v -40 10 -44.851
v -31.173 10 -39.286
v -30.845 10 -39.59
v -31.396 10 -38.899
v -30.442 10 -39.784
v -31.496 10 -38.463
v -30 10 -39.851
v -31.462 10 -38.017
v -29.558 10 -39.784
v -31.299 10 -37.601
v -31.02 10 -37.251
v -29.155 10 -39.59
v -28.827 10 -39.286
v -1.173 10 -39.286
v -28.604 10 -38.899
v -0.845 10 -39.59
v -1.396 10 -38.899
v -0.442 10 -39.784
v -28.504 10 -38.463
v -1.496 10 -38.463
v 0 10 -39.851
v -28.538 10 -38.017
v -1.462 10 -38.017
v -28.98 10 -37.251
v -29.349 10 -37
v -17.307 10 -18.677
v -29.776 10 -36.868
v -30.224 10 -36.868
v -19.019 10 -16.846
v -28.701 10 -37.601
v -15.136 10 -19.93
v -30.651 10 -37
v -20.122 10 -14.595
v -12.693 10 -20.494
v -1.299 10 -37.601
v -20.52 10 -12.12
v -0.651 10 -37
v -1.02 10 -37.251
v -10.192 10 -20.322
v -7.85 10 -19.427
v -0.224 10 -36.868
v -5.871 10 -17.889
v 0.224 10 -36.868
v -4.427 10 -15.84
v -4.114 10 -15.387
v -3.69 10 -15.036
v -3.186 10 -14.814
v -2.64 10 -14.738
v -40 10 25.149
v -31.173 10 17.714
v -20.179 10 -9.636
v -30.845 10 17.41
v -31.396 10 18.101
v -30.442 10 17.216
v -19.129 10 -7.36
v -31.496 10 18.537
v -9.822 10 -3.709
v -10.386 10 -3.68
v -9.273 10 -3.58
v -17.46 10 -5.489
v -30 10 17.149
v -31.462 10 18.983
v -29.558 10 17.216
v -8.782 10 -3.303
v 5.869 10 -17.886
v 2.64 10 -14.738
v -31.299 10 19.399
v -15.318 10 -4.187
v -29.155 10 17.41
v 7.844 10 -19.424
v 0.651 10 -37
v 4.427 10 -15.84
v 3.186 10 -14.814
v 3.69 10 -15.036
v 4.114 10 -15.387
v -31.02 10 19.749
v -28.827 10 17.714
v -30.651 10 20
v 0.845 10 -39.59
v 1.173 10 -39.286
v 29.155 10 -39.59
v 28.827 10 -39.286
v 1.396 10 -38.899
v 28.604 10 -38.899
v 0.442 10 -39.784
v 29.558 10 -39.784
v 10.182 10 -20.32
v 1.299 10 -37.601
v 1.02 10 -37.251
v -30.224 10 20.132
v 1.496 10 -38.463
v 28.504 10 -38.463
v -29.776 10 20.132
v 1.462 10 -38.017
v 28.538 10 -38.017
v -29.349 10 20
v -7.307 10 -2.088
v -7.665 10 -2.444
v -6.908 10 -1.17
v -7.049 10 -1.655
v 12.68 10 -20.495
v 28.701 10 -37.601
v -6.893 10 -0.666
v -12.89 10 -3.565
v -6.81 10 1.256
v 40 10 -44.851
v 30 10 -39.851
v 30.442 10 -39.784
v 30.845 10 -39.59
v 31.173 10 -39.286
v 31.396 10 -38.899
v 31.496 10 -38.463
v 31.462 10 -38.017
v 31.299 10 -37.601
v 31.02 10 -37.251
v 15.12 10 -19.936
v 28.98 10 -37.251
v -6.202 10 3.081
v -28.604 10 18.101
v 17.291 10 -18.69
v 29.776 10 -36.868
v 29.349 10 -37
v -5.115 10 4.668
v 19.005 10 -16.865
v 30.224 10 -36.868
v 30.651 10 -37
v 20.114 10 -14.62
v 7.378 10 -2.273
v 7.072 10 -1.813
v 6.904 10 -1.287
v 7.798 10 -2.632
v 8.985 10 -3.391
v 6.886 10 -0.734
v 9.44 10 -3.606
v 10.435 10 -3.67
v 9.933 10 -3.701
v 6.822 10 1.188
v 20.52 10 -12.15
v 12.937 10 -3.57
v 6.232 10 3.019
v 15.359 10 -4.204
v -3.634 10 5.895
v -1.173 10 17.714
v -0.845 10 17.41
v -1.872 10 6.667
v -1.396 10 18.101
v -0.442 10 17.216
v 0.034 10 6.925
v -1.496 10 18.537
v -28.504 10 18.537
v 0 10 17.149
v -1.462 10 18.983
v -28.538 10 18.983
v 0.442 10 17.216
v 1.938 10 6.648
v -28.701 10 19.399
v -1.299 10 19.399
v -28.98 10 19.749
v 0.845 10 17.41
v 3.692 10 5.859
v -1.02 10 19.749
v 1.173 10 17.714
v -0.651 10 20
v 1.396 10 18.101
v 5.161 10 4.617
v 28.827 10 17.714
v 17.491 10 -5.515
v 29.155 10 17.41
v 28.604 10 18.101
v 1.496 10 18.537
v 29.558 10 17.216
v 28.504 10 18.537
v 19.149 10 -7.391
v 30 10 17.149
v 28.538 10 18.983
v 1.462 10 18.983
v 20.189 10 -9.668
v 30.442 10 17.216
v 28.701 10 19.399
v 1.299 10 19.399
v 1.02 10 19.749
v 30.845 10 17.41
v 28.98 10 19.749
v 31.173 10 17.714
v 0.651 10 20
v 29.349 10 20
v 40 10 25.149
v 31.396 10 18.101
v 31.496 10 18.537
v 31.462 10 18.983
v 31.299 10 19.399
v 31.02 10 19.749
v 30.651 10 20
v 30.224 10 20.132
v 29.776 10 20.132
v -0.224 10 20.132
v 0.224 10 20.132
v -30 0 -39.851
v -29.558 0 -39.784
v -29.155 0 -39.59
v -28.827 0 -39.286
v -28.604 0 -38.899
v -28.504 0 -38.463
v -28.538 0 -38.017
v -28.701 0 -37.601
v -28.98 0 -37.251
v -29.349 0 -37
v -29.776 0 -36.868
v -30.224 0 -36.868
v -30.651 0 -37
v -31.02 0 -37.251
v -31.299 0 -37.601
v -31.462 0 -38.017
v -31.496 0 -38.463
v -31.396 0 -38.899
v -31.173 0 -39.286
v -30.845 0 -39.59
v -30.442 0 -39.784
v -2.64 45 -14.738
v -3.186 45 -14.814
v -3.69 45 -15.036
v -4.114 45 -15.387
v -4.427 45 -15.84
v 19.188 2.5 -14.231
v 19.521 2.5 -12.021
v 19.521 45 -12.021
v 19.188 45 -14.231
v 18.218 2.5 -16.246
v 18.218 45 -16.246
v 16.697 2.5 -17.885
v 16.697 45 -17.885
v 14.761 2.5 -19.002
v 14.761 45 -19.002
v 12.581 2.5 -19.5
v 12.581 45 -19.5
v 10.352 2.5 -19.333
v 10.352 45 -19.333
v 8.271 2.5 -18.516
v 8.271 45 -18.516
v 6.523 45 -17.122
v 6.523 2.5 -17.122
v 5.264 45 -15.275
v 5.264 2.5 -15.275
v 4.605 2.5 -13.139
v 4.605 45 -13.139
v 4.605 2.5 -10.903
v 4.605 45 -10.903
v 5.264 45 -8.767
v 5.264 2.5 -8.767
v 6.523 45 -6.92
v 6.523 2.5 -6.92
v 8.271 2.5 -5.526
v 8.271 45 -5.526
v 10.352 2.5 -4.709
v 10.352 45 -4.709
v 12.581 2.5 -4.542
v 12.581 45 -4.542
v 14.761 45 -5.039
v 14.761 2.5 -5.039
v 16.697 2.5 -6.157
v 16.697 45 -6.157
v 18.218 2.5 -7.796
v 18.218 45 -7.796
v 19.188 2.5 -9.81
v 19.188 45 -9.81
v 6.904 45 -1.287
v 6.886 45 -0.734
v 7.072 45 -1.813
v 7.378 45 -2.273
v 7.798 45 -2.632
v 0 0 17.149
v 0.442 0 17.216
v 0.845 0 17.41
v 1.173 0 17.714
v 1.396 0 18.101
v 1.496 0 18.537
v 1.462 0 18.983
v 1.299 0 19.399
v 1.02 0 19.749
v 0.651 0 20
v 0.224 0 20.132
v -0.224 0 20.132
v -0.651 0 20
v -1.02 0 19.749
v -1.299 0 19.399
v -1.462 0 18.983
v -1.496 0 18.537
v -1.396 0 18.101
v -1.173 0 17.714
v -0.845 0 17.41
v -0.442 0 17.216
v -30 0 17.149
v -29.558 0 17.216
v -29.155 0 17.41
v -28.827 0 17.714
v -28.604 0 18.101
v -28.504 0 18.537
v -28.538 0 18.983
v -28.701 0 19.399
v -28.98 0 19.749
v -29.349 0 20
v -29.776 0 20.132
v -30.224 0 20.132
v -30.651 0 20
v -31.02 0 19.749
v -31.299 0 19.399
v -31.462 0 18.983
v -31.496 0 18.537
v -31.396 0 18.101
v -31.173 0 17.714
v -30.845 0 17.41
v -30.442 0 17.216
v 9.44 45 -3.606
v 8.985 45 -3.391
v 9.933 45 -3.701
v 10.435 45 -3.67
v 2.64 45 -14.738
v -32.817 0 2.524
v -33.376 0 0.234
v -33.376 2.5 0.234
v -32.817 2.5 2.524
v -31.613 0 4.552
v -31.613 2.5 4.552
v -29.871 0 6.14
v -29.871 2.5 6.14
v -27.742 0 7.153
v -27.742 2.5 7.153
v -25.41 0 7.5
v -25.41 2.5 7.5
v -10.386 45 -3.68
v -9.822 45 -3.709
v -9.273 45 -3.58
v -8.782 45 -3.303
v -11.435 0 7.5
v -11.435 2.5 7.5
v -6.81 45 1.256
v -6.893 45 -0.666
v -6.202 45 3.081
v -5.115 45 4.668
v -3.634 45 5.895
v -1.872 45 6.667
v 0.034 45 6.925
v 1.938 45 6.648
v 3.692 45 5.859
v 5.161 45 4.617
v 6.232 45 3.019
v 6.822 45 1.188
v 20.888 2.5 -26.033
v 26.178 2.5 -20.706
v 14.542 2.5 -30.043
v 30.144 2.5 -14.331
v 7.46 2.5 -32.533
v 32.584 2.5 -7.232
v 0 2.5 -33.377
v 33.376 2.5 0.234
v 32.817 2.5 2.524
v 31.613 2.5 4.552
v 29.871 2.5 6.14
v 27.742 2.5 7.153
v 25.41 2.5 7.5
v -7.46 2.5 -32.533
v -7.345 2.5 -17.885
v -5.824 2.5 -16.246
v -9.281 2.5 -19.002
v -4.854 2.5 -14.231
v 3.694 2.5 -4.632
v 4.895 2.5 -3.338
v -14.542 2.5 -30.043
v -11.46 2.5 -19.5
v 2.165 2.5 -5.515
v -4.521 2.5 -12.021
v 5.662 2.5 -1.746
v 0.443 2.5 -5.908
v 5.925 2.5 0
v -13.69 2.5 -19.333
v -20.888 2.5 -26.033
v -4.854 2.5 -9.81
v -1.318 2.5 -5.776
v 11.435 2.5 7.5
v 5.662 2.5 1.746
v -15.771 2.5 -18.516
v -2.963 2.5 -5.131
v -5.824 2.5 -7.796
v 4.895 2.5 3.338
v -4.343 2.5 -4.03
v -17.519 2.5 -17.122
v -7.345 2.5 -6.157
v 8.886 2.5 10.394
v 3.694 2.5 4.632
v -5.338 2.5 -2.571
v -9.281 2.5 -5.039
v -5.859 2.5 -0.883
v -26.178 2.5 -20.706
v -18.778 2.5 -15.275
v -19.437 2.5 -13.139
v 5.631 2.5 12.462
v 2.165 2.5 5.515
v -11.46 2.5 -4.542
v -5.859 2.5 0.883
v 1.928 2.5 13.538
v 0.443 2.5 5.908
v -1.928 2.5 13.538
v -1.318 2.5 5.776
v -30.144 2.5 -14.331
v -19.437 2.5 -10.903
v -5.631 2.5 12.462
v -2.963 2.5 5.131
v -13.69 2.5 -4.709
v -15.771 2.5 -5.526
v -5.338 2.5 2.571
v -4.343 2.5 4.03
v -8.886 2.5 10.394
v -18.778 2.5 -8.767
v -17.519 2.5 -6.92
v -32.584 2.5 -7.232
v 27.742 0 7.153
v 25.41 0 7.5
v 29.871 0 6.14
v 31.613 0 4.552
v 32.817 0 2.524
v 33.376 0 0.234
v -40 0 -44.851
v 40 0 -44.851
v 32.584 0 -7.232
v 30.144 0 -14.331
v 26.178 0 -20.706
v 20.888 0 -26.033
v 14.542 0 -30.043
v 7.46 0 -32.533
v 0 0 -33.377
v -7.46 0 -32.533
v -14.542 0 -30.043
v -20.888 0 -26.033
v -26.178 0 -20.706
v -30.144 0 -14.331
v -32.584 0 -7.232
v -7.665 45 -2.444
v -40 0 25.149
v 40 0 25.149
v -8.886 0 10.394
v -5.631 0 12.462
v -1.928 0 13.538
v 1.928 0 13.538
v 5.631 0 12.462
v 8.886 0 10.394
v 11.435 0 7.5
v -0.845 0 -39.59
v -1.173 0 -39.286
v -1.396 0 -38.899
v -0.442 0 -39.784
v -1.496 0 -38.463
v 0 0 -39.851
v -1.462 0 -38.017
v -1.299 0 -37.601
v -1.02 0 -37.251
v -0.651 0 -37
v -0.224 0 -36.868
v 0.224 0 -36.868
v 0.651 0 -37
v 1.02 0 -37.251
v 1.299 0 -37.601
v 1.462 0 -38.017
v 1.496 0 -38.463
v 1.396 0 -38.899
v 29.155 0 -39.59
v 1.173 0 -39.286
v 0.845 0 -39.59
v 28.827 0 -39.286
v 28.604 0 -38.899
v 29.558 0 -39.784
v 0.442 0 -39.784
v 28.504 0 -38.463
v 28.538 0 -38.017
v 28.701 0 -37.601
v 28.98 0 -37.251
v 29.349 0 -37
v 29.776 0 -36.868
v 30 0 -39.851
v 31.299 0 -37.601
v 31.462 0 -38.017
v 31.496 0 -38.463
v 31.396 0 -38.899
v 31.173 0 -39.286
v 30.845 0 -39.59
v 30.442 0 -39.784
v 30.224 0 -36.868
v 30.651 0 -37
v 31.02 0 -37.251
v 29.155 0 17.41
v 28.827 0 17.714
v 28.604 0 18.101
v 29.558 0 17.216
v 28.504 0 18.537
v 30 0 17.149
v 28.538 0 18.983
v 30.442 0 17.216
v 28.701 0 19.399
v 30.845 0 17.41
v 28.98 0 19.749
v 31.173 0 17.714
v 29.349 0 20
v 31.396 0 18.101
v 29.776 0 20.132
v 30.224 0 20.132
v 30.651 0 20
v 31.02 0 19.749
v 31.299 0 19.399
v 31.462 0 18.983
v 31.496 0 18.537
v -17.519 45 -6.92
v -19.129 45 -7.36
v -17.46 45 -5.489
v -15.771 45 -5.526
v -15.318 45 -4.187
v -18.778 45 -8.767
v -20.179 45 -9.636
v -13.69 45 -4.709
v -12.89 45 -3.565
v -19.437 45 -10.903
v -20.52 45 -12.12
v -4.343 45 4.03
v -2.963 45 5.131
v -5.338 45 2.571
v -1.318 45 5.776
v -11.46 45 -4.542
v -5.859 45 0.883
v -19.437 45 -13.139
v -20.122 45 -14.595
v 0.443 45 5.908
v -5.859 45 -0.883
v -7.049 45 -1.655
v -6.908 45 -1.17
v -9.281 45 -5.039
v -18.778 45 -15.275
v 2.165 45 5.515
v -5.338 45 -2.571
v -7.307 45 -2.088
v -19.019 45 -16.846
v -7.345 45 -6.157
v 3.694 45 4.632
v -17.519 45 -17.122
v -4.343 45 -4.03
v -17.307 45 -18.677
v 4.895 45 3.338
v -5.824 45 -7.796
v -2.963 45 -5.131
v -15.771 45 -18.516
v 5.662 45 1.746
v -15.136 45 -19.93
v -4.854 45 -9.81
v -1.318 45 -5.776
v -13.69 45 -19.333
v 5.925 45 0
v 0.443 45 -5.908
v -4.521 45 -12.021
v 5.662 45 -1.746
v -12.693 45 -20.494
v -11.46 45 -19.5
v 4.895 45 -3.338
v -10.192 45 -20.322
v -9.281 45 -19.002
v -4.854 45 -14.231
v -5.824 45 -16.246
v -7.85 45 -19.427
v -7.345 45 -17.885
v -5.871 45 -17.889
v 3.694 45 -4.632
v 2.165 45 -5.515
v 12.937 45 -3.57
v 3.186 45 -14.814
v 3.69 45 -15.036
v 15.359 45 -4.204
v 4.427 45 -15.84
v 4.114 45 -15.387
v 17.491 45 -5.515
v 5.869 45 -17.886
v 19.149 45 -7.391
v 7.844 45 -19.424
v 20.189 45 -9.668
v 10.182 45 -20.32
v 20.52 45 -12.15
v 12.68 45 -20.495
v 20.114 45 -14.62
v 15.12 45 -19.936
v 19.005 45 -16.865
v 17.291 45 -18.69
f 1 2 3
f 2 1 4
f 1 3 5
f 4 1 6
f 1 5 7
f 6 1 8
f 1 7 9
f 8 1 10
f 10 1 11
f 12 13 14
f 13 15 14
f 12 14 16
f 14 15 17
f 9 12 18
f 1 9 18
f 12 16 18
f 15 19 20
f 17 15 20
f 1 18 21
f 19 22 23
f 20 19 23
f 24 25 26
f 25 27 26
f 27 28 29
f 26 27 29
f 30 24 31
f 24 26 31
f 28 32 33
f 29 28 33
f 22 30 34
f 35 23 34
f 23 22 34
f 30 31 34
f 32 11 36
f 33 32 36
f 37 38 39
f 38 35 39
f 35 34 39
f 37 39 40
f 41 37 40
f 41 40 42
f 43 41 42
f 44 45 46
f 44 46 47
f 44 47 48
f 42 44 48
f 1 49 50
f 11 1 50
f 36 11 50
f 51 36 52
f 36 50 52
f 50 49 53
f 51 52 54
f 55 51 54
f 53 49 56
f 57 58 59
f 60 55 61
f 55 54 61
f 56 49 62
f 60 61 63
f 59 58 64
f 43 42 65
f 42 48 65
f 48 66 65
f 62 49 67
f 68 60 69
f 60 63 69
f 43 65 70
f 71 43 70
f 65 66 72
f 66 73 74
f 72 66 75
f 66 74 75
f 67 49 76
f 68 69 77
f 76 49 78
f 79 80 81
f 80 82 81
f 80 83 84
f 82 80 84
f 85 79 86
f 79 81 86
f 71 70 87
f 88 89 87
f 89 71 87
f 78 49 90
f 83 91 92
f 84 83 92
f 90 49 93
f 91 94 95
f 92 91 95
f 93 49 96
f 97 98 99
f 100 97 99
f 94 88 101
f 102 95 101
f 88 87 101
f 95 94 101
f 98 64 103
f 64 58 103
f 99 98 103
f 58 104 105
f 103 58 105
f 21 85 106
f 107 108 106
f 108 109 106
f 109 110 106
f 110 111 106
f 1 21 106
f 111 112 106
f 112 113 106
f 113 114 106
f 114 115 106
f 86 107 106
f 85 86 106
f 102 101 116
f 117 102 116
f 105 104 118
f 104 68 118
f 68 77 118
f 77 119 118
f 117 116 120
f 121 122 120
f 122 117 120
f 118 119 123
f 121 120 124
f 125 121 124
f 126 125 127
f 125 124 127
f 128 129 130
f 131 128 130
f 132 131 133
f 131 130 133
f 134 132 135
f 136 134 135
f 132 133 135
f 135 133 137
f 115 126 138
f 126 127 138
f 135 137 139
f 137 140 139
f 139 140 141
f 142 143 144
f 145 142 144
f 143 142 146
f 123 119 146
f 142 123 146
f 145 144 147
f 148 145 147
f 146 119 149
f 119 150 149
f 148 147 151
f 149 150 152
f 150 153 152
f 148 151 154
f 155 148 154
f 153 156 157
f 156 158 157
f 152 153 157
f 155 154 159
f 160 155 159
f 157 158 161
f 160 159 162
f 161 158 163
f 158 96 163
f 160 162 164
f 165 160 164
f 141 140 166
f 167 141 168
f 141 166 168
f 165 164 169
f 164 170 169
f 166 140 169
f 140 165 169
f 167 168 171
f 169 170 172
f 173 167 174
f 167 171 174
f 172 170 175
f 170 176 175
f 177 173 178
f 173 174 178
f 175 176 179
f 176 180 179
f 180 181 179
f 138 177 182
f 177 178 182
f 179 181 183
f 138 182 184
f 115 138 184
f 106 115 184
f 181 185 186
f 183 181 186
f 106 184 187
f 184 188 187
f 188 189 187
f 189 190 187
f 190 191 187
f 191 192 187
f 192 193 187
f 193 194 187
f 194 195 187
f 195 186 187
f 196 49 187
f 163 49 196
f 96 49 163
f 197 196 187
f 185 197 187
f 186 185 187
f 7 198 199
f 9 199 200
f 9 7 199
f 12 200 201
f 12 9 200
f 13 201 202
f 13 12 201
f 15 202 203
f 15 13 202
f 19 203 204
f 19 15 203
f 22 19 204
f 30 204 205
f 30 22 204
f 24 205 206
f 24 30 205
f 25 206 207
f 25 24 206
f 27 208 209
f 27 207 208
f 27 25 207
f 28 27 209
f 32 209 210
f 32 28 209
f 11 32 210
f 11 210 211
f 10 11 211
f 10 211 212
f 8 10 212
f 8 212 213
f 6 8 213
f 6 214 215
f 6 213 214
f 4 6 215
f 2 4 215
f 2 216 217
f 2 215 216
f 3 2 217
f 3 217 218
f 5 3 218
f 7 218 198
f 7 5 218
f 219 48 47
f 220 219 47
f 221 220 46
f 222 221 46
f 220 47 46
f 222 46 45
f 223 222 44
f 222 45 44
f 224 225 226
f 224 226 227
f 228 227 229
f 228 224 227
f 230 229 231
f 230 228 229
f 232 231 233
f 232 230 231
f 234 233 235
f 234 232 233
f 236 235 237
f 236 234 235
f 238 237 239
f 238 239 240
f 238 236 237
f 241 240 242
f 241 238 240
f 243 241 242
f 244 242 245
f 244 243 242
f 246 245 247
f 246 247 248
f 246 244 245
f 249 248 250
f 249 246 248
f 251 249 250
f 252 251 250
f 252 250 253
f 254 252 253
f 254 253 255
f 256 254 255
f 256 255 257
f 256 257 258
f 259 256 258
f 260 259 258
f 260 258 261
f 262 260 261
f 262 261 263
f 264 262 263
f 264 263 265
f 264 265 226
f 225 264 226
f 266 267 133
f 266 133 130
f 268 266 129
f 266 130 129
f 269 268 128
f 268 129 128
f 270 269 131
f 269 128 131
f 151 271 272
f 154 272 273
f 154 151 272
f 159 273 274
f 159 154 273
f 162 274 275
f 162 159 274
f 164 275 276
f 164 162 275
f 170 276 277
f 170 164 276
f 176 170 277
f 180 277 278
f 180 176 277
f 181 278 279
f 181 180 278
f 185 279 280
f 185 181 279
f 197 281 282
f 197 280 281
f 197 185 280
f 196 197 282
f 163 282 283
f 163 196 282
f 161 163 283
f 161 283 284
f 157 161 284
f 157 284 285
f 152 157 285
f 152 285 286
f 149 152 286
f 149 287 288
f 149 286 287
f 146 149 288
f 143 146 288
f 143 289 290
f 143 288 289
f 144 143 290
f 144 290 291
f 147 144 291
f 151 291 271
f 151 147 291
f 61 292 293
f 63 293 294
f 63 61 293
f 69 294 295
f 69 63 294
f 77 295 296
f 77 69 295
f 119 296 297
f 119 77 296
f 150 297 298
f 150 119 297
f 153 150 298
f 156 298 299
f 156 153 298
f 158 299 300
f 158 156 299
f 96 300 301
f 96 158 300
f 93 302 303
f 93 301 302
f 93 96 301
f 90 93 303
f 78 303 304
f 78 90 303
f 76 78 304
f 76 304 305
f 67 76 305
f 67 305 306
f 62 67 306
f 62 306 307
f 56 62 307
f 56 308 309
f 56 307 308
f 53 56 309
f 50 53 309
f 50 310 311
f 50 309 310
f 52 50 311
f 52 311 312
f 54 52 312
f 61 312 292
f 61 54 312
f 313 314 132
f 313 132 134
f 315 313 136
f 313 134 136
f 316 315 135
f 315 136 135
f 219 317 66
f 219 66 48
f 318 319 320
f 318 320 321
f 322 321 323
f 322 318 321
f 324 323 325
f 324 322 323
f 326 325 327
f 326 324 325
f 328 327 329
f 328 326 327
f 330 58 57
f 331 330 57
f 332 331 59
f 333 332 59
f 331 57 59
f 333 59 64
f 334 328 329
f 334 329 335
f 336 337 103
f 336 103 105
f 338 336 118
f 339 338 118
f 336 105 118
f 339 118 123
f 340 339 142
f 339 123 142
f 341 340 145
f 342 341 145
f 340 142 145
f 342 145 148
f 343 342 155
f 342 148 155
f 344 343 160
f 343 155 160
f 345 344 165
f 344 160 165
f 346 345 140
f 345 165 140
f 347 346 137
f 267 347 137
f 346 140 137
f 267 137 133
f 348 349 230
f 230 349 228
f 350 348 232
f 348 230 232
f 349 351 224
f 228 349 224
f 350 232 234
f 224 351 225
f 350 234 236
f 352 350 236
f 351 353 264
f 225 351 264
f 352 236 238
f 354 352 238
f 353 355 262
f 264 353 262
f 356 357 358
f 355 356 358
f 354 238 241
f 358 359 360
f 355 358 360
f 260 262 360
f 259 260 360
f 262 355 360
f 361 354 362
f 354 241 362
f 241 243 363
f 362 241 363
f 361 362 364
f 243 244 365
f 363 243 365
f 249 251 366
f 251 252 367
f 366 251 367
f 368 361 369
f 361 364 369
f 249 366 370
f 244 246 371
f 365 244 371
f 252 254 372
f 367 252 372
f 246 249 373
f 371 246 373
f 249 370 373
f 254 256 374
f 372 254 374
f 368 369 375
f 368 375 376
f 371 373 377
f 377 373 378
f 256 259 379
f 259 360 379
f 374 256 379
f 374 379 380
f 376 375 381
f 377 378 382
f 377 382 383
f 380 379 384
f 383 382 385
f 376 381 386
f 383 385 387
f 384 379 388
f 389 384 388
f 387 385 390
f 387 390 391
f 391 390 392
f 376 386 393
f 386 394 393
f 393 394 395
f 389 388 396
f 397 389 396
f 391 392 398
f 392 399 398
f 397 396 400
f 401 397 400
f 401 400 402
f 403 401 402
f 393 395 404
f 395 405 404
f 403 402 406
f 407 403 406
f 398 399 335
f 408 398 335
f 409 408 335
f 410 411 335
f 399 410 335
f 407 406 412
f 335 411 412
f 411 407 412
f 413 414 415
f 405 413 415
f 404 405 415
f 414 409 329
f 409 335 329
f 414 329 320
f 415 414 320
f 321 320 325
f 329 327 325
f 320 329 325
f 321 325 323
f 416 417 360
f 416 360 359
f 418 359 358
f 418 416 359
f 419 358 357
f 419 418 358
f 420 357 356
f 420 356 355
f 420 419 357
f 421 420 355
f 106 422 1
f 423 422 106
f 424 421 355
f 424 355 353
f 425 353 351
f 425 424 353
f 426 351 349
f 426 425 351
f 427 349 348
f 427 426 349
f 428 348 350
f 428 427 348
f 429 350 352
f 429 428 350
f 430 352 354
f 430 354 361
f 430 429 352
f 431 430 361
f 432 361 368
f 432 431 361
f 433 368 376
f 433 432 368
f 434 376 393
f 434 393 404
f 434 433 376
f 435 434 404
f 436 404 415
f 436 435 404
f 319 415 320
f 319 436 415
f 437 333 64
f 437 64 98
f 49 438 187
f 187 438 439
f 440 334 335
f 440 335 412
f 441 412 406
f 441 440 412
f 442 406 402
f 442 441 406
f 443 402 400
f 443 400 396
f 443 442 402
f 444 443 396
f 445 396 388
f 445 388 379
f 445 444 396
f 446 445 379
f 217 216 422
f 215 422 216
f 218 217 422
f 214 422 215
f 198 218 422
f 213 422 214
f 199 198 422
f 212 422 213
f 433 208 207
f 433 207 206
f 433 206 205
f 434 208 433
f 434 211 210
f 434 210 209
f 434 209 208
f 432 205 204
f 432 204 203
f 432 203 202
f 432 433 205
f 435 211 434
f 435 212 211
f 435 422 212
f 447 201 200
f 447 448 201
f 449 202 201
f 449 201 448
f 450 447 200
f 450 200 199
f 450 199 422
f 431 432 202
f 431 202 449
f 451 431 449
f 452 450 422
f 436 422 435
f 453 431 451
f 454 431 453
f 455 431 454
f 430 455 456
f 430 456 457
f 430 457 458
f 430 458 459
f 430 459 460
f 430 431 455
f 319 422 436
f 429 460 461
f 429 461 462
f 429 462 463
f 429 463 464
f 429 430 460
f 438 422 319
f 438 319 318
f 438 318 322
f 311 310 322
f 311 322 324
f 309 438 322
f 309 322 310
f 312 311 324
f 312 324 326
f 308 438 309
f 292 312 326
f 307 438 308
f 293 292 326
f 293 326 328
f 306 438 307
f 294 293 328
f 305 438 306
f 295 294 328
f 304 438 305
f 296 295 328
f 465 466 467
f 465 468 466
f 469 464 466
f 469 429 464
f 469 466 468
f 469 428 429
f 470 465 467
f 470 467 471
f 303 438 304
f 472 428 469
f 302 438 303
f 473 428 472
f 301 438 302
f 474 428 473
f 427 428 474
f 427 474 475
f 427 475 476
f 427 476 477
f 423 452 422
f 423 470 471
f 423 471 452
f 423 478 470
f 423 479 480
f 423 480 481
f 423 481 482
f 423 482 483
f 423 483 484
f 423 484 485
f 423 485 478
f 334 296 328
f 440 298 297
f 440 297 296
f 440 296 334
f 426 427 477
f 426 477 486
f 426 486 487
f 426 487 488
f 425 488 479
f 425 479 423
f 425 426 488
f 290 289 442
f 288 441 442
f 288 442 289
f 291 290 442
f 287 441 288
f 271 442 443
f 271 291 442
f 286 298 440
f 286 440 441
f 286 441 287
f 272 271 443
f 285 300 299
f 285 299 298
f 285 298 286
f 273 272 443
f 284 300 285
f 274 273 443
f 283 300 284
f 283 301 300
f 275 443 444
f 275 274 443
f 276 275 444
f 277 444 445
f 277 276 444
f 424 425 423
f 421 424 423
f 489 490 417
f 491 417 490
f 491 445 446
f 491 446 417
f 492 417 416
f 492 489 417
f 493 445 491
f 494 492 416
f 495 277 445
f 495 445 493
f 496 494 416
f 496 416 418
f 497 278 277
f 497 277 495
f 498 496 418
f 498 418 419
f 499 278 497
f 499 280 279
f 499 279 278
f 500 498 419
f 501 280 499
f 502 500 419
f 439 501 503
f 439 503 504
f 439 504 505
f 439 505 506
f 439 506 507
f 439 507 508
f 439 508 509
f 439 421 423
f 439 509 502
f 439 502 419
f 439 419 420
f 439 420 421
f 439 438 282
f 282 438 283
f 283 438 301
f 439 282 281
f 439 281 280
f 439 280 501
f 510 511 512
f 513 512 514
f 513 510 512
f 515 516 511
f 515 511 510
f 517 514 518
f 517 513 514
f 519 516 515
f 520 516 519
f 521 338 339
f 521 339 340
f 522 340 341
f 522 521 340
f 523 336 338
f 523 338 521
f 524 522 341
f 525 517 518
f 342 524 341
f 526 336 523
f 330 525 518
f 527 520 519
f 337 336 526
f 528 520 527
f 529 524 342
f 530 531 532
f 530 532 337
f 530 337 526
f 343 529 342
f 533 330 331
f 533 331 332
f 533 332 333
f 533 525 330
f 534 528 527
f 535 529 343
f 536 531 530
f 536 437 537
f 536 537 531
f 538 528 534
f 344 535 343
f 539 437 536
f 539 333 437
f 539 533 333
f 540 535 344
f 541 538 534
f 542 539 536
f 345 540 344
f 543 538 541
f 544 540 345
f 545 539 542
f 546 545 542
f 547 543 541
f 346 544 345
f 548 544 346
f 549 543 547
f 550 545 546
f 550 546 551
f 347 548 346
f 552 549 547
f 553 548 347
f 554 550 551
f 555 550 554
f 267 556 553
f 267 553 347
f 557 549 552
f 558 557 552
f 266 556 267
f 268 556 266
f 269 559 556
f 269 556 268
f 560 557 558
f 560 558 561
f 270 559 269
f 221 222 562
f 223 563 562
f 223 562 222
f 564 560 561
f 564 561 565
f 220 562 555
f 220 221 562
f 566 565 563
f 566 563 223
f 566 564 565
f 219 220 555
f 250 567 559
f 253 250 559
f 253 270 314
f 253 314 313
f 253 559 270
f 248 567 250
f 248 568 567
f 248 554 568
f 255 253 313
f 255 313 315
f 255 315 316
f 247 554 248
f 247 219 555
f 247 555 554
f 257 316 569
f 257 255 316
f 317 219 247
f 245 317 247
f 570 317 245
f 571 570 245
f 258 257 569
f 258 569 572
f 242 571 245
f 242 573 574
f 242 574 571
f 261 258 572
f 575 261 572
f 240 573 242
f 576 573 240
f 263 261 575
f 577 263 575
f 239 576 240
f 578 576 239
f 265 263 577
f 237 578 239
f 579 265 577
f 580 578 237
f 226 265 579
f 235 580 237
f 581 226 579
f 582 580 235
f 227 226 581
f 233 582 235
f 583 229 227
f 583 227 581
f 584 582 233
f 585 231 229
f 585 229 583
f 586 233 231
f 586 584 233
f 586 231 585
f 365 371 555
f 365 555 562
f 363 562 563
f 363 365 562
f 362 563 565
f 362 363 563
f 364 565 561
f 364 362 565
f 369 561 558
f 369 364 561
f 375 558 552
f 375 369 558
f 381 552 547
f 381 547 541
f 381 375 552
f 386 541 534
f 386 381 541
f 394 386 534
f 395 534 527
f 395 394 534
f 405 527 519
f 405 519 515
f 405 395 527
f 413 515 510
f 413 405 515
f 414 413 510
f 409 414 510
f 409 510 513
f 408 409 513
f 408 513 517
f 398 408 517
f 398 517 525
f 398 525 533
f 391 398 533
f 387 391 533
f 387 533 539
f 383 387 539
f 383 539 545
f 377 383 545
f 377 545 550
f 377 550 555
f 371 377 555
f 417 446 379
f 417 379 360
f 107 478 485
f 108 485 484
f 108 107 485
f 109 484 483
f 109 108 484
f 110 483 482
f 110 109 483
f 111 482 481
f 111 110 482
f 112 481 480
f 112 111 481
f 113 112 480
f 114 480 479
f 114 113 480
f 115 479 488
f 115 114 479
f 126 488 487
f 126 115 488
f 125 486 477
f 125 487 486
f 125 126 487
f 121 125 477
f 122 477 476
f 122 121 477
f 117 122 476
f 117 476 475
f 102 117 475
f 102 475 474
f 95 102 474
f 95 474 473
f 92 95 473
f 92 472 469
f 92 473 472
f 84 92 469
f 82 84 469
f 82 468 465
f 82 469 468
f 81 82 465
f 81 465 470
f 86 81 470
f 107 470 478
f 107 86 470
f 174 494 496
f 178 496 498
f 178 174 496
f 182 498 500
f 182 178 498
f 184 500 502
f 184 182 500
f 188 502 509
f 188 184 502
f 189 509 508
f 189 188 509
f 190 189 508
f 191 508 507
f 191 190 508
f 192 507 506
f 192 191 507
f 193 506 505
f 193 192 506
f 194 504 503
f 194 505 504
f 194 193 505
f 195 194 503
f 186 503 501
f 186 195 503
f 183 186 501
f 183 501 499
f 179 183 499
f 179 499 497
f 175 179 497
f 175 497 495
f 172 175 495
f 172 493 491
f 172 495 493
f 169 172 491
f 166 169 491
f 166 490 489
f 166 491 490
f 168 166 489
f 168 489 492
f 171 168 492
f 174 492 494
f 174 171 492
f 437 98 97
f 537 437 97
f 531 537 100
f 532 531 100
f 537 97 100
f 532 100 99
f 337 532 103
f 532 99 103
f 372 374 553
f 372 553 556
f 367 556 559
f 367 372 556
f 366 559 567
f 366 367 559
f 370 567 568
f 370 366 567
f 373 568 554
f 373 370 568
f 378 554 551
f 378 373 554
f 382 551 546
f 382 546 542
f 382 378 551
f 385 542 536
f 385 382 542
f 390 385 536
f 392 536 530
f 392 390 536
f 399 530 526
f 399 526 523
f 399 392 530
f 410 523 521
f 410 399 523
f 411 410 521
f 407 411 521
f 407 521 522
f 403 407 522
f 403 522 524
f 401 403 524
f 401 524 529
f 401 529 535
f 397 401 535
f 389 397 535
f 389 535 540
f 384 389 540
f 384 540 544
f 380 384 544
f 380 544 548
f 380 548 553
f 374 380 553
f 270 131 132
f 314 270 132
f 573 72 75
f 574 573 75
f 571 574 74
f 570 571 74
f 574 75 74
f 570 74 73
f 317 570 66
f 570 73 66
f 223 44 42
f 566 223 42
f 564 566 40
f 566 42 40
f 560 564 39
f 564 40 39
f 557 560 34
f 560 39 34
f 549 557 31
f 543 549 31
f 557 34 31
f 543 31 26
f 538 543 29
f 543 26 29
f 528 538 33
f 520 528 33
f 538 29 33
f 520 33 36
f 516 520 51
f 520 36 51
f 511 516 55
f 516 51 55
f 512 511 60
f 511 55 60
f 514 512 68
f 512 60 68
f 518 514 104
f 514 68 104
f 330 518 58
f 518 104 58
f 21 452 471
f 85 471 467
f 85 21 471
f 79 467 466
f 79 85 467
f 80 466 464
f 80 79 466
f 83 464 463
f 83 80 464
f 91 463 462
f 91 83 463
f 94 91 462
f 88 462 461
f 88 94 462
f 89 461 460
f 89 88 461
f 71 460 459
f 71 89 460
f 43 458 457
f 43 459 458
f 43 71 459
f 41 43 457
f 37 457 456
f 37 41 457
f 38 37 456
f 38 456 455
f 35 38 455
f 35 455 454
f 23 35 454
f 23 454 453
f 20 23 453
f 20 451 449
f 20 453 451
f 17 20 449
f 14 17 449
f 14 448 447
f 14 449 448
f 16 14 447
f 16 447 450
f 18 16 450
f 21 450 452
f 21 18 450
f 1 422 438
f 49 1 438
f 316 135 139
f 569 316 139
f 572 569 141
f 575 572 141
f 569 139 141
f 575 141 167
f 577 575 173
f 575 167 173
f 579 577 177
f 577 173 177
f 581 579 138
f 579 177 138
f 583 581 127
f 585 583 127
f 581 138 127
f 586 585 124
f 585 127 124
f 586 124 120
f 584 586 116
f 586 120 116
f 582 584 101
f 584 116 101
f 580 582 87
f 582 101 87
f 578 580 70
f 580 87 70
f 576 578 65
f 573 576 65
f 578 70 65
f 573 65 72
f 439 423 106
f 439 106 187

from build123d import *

# Parameters (mm, degrees)
BOSS_EXTRUDE1_OUTLINE_R   = 5.925
BOSS_EXTRUDE1_OUTLINE_R_2 = 7.5
BOSS_EXTRUDE1_DEPTH       = 45
SKETCH7_W                 = 80
SKETCH7_H                 = 70
BOSS_EXTRUDE2_DEPTH       = 10
SKETCH9_R                 = 1.5
SKETCH9_R_2               = 7.5
SKETCH9_R_3               = 5.925
CUT_EXTRUDE1_DEPTH        = 70.545797618
CUT_EXTRUDE2_DEPTH        = 2.5


# Read off the part's stored shape, not the designer's step: Boss-Extrude1
with BuildPart() as part:
    # Boss-Extrude1 outline → Boss-Extrude1 (new body)
    with BuildSketch(Plane(origin=(0, 0, 0), x_dir=(1, 0, 0), z_dir=(0, 1, 0))):
        with BuildLine():
            Line((2.640241809, 14.738319), (-2.640241809, 14.738319))
            ThreePointArc((-2.640241809, 14.738319), (-3.689731143, 15.03579965), (-4.427017708, 15.839746863))
            ThreePointArc((-4.427017708, 15.839746863), (-19.653719539, 15.760972037), (-10.385543741, 3.679599122))
            ThreePointArc((-10.385543741, 3.679599122), (-9.543059286, 3.663879971), (-8.781822294, 3.302569315))
            Line((-8.781822294, 3.302569315), (-7.664695593, 2.443767924))
            ThreePointArc((-7.664695593, 2.443767924), (-7.049045485, 1.654548176), (-6.892913986, 0.665854179))
            ThreePointArc((-6.892913986, 0.665854179), (0.034441884, -6.92491435), (6.88594973, 0.734384995))
            ThreePointArc((6.88594973, 0.734384995), (7.072047194, 1.812821739), (7.797876599, 2.63186371))
            Line((7.797876599, 2.63186371), (8.985297239, 3.390509952))
            ThreePointArc((8.985297239, 3.390509952), (9.683500506, 3.668968165), (10.435182401, 3.670020805))
            ThreePointArc((10.435182401, 3.670020805), (19.642563369, 15.783654111), (4.427017708, 15.839746863))
            ThreePointArc((4.427017708, 15.839746863), (3.689731143, 15.03579965), (2.640241809, 14.738319))
        make_face()
        Circle(BOSS_EXTRUDE1_OUTLINE_R, mode=Mode.SUBTRACT)
        with Locations((-12.02081528, 12.02081528)):
            Circle(BOSS_EXTRUDE1_OUTLINE_R_2, mode=Mode.SUBTRACT)
        with Locations((12.02081528, 12.02081528)):
            Circle(BOSS_EXTRUDE1_OUTLINE_R_2, mode=Mode.SUBTRACT)
    extrude(amount=BOSS_EXTRUDE1_DEPTH)

    # Sketch7 → Boss-Extrude2 (add)
    # profile 1 of 2: a face of its own
    with BuildSketch(Plane.XZ):
        with Locations((0, -9.851064271)):
            Rectangle(SKETCH7_W, SKETCH7_H)
        with BuildLine():
            ThreePointArc((6.88594973, -0.734384995), (7.072047194, -1.812821739), (7.797876599, -2.63186371))
            Line((7.797876599, -2.63186371), (8.985297239, -3.390509952))
            ThreePointArc((8.985297239, -3.390509952), (9.683500506, -3.668968165), (10.435182401, -3.670020805))
            ThreePointArc((10.435182401, -3.670020805), (19.642563369, -15.783654111), (4.427017708, -15.839746863))
            ThreePointArc((4.427017708, -15.839746863), (3.689731143, -15.03579965), (2.640241809, -14.738319))
            Line((2.640241809, -14.738319), (-2.640241809, -14.738319))
            ThreePointArc((-2.640241809, -14.738319), (-3.689731143, -15.03579965), (-4.427017708, -15.839746863))
            ThreePointArc((-4.427017708, -15.839746863), (-19.653719539, -15.760972037), (-10.385543741, -3.679599122))
            ThreePointArc((-10.385543741, -3.679599122), (-9.543059286, -3.663879971), (-8.781822294, -3.302569315))
            Line((-8.781822294, -3.302569315), (-7.664695593, -2.443767924))
            ThreePointArc((-7.664695593, -2.443767924), (-7.049045485, -1.654548176), (-6.892913986, -0.665854179))
            ThreePointArc((-6.892913986, -0.665854179), (0.034441884, 6.92491435), (6.88594973, -0.734384995))
        make_face(mode=Mode.SUBTRACT)
    # profile 2 of 2: a face of its own
    with BuildSketch(Plane.XZ):
        with Locations((0, -9.851064271)):
            Rectangle(SKETCH7_W, SKETCH7_H)
        with BuildLine():
            ThreePointArc((6.88594973, -0.734384995), (7.072047194, -1.812821739), (7.797876599, -2.63186371))
            Line((7.797876599, -2.63186371), (8.985297239, -3.390509952))
            ThreePointArc((8.985297239, -3.390509952), (9.683500506, -3.668968165), (10.435182401, -3.670020805))
            ThreePointArc((10.435182401, -3.670020805), (19.642563369, -15.783654111), (4.427017708, -15.839746863))
            ThreePointArc((4.427017708, -15.839746863), (3.689731143, -15.03579965), (2.640241809, -14.738319))
            Line((2.640241809, -14.738319), (-2.640241809, -14.738319))
            ThreePointArc((-2.640241809, -14.738319), (-3.689731143, -15.03579965), (-4.427017708, -15.839746863))
            ThreePointArc((-4.427017708, -15.839746863), (-19.653719539, -15.760972037), (-10.385543741, -3.679599122))
            ThreePointArc((-10.385543741, -3.679599122), (-9.543059286, -3.663879971), (-8.781822294, -3.302569315))
            Line((-8.781822294, -3.302569315), (-7.664695593, -2.443767924))
            ThreePointArc((-7.664695593, -2.443767924), (-7.049045485, -1.654548176), (-6.892913986, -0.665854179))
            ThreePointArc((-6.892913986, -0.665854179), (0.034441884, 6.92491435), (6.88594973, -0.734384995))
        make_face(mode=Mode.SUBTRACT)
    extrude(amount=-BOSS_EXTRUDE2_DEPTH)

    # Sketch9 → Cut-Extrude1 (cut, through all)
    with BuildSketch(Plane(origin=(0, 10, 0), x_dir=(-1, 0, 0), z_dir=(0, -1, 0))):
        with Locations(Location((-30, 38.351064271, 0), (0, 0, 90))):
            Circle(SKETCH9_R)
        with Locations(Location((-30, -18.648935729, 0), (0, 0, 90))):
            Circle(SKETCH9_R)
        with Locations(Location((0, -18.648935729, 0), (0, 0, 90))):
            Circle(SKETCH9_R)
        with Locations(Location((30, -18.648935729, 0), (0, 0, 90))):
            Circle(SKETCH9_R)
        with Locations(Location((30, 38.351064271, 0), (0, 0, 90))):
            Circle(SKETCH9_R)
        with Locations(Location((0, 38.351064271, 0), (0, 0, 90))):
            Circle(SKETCH9_R)
        with Locations(Location((-12.02081528, 12.02081528, 0), (0, 0, 90))):
            Circle(SKETCH9_R_2)
        with Locations(Location((12.02081528, 12.02081528, 0), (0, 0, 90))):
            Circle(SKETCH9_R_2)
        with Locations(Location((0, 0, 0), (0, 0, 90))):
            Circle(SKETCH9_R_3)
    extrude(amount=CUT_EXTRUDE1_DEPTH, mode=Mode.SUBTRACT)

    # Sketch10 → Cut-Extrude2 (cut)
    with BuildSketch(Plane(origin=(0, 0, 0), x_dir=(-1, 0, 0), z_dir=(0, 1, 0))):
        with BuildLine():
            Line((-11.434840744, 7.500002811), (-25.410017566, 7.500002811))
            ThreePointArc((-25.410017566, 7.500002811), (-30.80127054, 5.410534914), (-33.376311069, 0.233600397))
            ThreePointArc((-33.376311069, 0.233600397), (-4.816e-06, -33.377128543), (33.376311137, 0.233590765))
            ThreePointArc((33.376311137, 0.233590765), (30.801273238, 5.410526556), (25.410021357, 7.499997189))
            Line((25.410021357, 7.499997189), (11.434844431, 7.499997189))
            ThreePointArc((11.434844431, 7.499997189), (3.362e-06, 13.675), (-11.434840744, 7.500002811))
        make_face()
    extrude(amount=CUT_EXTRUDE2_DEPTH, mode=Mode.SUBTRACT)


solid = part.part
